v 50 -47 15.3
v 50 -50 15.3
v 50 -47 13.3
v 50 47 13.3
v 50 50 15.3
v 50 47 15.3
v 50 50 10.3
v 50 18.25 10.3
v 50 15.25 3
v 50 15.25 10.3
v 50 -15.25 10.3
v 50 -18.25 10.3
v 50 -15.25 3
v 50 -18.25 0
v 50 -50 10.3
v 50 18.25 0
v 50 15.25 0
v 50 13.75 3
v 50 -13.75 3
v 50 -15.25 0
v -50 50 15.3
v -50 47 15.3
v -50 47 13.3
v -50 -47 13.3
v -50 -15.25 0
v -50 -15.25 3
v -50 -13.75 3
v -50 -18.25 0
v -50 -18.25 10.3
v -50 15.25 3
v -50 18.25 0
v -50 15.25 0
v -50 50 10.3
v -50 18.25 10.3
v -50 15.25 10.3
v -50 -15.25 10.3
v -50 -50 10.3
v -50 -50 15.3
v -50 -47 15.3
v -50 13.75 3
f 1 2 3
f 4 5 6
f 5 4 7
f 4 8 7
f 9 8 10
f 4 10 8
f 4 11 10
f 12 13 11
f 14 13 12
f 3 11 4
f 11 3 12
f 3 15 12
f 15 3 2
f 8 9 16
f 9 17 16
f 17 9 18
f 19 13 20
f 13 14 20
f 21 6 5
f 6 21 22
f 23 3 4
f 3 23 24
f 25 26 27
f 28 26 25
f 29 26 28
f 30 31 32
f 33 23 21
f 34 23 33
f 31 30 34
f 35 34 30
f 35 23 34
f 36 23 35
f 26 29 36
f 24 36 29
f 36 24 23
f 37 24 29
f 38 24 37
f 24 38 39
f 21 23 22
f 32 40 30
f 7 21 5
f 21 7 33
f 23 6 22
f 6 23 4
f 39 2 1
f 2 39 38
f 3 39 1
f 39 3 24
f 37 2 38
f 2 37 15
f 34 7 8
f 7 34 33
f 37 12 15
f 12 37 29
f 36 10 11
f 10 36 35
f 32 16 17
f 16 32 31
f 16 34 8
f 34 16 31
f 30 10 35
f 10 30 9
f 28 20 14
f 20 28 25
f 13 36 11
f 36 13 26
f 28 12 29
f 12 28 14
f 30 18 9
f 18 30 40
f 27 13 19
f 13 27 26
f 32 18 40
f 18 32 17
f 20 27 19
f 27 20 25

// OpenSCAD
// ============================================================
//  隔板顶置置物架 — Partition Top Shelf
//  参数化 OpenSCAD 模型
//  卡在工位隔板顶端，上方置物板用于放置物品
//  安装方式：对准隔板顶端垂直下压，弹性卡入，可反复拆装
// ============================================================
//
//  隔板剖面（沿长度方向看，挂钩空腔与其互补）：
//
//        panel_t
//   |----------------|   -- top_h（顶端段）
//   |                |
//   |--|          |--|   -- 顶端底面台阶（卡爪勾住此处）
//       |          |
//       | (凹槽)    |     -- 宽度深度无需精确，
//   |--|          |--|      只要收窄量 > claw_bite 即可
//   |                |
//
//  卡入原理：两侧壁下端各有一个小三角卡爪（尖端向内凸出
//  claw_bite ≈ 1.5mm，进入方向为缓斜面）。下压时隔板顶段
//  底面的台阶角沿斜面滑过，把两壁向外撑开约 1.5mm 后弹回，
//  卡爪上表面随即勾住隔板顶段底面的台阶。
//  承重：物品重量经置物板直接压在隔板顶面（留 vclr 悬浮
//  间隙）；卡爪只负责防脱落与定位，因此凹槽宽深无需实测。
//  拆卸：用力上拔，卡爪勾合面产生弹性变形即可脱出。

// ===== 隔板参数 =====

panel_t = 30;   // mm 隔板厚度（用户给定 3cm）
top_h   = 7;    // mm 隔板顶端到收窄处的距离（用户给定 5mm）

// ===== 置物架参数 =====

hook_length = 100;   // mm 1.长：沿轨道方向，与轨道长度相同
shelf_w     = 100;  // mm 2.宽：置物板总宽，与轨道居中对齐、两侧对称伸出
shelf_t     = 3;    // mm 3.置物板厚度
lip_h       = 2;    // mm 4.边缘凸缘高度（默认 2mm，防止物品滑落）

// ===== 卡爪与配合参数 =====

claw_bite = 1.5;   // mm 卡爪尖端向内凸出量（1~2mm，能勾住即可；
                   //    隔板顶端下方收窄量大于此值即可安装）
claw_h    = 3;     // mm 卡爪高度（决定进入斜面坡度，越大进入越省力）
wall      = 3;     // mm 侧壁厚度
clr       = 0.25;  // mm 宽腔侧向间隙（单边）
vclr      = 0.3;   // mm 竖向悬浮间隙（置物板底面与隔板顶面）

// ===== 预览开关 =====

show_on_panel = false;   // true=装配到隔板预览 / false=打印姿态

// ===== 内部派生尺寸 =====

_cav_w    = panel_t + 2 * clr;             // 宽腔宽度（容纳隔板顶端段）
_body_w   = panel_t + 2 * clr + 2 * wall;  // 挂钩主体宽度
_claw_z1  = -top_h;                        // 卡爪上表面（勾住顶段底面台阶）
_claw_z0  = _claw_z1 - claw_h;             // 卡爪斜面底端 = 主体下缘
_base_z   = _claw_z0;
_shelf_z0 = vclr;                          // 置物板底面（悬于隔板顶面上方）
_shelf_z1 = _shelf_z0 + shelf_t;           // 置物板顶面

assert(shelf_w >= _body_w, "shelf_w（置物板宽度）必须不小于挂钩主体宽度");
assert(claw_bite > 0 && claw_bite <= 3, "claw_bite 应在 0~3mm 之间");
assert(lip_h >= 0, "lip_h 不能为负");

// ============================================================
// ===== 模块定义 =====
// ============================================================

// ------------------------------------------------------------
// 置物板
//   与轨道居中对齐，两侧对称伸出
// ------------------------------------------------------------
module shelf() {
    translate([0, 0, _shelf_z0 + shelf_t / 2])
        cube([hook_length, shelf_w, shelf_t], center = true);
}

// ------------------------------------------------------------
// 防滑落凸缘
//   仅沿轨道方向布置两道（垂直于轨道的两端不设），
//   外侧面与置物板边缘齐平，平面内厚度与置物板相同
// ------------------------------------------------------------
module lips() {
    lip_t = shelf_t;   // 凸缘平面内厚度
    for (s = [1, -1])
        translate([0, s * (shelf_w / 2 - lip_t / 2), _shelf_z1 + lip_h / 2])
            cube([hook_length, lip_t, lip_h], center = true);
}

// ------------------------------------------------------------
// 侧壁（两根）
//   包裹隔板顶端段两侧，上接置物板，下缘与卡爪斜面底端齐平
// ------------------------------------------------------------
module rails() {
    for (s = [1, -1])
        translate([0, s * (panel_t / 2 + clr + wall / 2),
                   (_base_z + _shelf_z0) / 2])
            cube([hook_length, wall, _shelf_z0 - _base_z], center = true);
}

// ------------------------------------------------------------
// 卡爪（两只，直角三角形柱，沿长度方向贯通）
//   上边水平：勾住隔板顶段底面台阶（z = -top_h）
//   下边斜面：进入引导面，下压时隔板台阶沿此滑过撑开侧壁
//   尖端向内凸出 claw_bite，落入隔板顶端下方的收窄范围内
// ------------------------------------------------------------
module claw_half() {
    translate([hook_length / 2, 0, 0])
        rotate([0, -90, 0])          // 挤出方向：局部 +Z → 全局 -X
            linear_extrude(height = hook_length)
                polygon([
                    [-top_h, panel_t / 2 + clr],                // 壁面顶角
                    [-top_h, panel_t / 2 + clr - claw_bite],    // 尖端
                    [-top_h - claw_h, panel_t / 2 + clr],       // 壁面底角
                ]);
}

module claws() {
    claw_half();
    mirror([0, 1, 0])
        claw_half();
}

// ------------------------------------------------------------
// 宽腔：容纳隔板顶端段
//   只开到卡爪上表面高度，避免切除下方卡爪；
//   卡爪之间、卡爪以下区域保持敞开，供隔板收窄处通过
// ------------------------------------------------------------
module cavity() {
    translate([0, 0, (-top_h + _shelf_z0) / 2])
        cube([hook_length + 2, _cav_w, _shelf_z0 + top_h], center = true);
}

// ------------------------------------------------------------
// 置物架主体
// ------------------------------------------------------------
module partition_shelf() {
    difference() {
        union() {
            shelf();
            lips();
            rails();
            claws();
        }
        cavity();
    }
}

// ============================================================
// ===== 预览 / 打印模块 =====
// ============================================================

// 预览用的一段隔板（不打印；凹槽尺寸仅为示意，不影响实体模型）
module panel_preview() {
    seg = hook_length + 40;
    demo_groove_w = 20;
    demo_groove_h = 5;
    union() {
        translate([0, 0, -top_h / 2])
            cube([seg, panel_t, top_h], center = true);
        translate([0, 0, -top_h - demo_groove_h / 2])
            cube([seg, demo_groove_w, demo_groove_h], center = true);
        translate([0, 0, -top_h - demo_groove_h - 20])
            cube([seg, panel_t, 40], center = true);
    }
}

// 装配预览：置物架就位到隔板
module assembly() {
    color("Gray", 0.5)
        panel_preview();
    color("SteelBlue", 0.95)
        partition_shelf();
}

// 打印姿态：主体下缘贴床，无需支撑
//   卡爪进入斜面约 27° 自承；置物板底面一处 30.5mm 短桥接
module print_parts() {
    translate([0, 0, top_h + claw_h])
        partition_shelf();
}

// ============================================================
// ===== 执行入口 =====
// ============================================================

if (show_on_panel) {
    assembly();
} else {
    print_parts();
}

// ============================================================
// ===== 快速测试：取消注释以单独预览某个模块 =====
// ============================================================
// partition_shelf();
// assembly();
// print_parts();
